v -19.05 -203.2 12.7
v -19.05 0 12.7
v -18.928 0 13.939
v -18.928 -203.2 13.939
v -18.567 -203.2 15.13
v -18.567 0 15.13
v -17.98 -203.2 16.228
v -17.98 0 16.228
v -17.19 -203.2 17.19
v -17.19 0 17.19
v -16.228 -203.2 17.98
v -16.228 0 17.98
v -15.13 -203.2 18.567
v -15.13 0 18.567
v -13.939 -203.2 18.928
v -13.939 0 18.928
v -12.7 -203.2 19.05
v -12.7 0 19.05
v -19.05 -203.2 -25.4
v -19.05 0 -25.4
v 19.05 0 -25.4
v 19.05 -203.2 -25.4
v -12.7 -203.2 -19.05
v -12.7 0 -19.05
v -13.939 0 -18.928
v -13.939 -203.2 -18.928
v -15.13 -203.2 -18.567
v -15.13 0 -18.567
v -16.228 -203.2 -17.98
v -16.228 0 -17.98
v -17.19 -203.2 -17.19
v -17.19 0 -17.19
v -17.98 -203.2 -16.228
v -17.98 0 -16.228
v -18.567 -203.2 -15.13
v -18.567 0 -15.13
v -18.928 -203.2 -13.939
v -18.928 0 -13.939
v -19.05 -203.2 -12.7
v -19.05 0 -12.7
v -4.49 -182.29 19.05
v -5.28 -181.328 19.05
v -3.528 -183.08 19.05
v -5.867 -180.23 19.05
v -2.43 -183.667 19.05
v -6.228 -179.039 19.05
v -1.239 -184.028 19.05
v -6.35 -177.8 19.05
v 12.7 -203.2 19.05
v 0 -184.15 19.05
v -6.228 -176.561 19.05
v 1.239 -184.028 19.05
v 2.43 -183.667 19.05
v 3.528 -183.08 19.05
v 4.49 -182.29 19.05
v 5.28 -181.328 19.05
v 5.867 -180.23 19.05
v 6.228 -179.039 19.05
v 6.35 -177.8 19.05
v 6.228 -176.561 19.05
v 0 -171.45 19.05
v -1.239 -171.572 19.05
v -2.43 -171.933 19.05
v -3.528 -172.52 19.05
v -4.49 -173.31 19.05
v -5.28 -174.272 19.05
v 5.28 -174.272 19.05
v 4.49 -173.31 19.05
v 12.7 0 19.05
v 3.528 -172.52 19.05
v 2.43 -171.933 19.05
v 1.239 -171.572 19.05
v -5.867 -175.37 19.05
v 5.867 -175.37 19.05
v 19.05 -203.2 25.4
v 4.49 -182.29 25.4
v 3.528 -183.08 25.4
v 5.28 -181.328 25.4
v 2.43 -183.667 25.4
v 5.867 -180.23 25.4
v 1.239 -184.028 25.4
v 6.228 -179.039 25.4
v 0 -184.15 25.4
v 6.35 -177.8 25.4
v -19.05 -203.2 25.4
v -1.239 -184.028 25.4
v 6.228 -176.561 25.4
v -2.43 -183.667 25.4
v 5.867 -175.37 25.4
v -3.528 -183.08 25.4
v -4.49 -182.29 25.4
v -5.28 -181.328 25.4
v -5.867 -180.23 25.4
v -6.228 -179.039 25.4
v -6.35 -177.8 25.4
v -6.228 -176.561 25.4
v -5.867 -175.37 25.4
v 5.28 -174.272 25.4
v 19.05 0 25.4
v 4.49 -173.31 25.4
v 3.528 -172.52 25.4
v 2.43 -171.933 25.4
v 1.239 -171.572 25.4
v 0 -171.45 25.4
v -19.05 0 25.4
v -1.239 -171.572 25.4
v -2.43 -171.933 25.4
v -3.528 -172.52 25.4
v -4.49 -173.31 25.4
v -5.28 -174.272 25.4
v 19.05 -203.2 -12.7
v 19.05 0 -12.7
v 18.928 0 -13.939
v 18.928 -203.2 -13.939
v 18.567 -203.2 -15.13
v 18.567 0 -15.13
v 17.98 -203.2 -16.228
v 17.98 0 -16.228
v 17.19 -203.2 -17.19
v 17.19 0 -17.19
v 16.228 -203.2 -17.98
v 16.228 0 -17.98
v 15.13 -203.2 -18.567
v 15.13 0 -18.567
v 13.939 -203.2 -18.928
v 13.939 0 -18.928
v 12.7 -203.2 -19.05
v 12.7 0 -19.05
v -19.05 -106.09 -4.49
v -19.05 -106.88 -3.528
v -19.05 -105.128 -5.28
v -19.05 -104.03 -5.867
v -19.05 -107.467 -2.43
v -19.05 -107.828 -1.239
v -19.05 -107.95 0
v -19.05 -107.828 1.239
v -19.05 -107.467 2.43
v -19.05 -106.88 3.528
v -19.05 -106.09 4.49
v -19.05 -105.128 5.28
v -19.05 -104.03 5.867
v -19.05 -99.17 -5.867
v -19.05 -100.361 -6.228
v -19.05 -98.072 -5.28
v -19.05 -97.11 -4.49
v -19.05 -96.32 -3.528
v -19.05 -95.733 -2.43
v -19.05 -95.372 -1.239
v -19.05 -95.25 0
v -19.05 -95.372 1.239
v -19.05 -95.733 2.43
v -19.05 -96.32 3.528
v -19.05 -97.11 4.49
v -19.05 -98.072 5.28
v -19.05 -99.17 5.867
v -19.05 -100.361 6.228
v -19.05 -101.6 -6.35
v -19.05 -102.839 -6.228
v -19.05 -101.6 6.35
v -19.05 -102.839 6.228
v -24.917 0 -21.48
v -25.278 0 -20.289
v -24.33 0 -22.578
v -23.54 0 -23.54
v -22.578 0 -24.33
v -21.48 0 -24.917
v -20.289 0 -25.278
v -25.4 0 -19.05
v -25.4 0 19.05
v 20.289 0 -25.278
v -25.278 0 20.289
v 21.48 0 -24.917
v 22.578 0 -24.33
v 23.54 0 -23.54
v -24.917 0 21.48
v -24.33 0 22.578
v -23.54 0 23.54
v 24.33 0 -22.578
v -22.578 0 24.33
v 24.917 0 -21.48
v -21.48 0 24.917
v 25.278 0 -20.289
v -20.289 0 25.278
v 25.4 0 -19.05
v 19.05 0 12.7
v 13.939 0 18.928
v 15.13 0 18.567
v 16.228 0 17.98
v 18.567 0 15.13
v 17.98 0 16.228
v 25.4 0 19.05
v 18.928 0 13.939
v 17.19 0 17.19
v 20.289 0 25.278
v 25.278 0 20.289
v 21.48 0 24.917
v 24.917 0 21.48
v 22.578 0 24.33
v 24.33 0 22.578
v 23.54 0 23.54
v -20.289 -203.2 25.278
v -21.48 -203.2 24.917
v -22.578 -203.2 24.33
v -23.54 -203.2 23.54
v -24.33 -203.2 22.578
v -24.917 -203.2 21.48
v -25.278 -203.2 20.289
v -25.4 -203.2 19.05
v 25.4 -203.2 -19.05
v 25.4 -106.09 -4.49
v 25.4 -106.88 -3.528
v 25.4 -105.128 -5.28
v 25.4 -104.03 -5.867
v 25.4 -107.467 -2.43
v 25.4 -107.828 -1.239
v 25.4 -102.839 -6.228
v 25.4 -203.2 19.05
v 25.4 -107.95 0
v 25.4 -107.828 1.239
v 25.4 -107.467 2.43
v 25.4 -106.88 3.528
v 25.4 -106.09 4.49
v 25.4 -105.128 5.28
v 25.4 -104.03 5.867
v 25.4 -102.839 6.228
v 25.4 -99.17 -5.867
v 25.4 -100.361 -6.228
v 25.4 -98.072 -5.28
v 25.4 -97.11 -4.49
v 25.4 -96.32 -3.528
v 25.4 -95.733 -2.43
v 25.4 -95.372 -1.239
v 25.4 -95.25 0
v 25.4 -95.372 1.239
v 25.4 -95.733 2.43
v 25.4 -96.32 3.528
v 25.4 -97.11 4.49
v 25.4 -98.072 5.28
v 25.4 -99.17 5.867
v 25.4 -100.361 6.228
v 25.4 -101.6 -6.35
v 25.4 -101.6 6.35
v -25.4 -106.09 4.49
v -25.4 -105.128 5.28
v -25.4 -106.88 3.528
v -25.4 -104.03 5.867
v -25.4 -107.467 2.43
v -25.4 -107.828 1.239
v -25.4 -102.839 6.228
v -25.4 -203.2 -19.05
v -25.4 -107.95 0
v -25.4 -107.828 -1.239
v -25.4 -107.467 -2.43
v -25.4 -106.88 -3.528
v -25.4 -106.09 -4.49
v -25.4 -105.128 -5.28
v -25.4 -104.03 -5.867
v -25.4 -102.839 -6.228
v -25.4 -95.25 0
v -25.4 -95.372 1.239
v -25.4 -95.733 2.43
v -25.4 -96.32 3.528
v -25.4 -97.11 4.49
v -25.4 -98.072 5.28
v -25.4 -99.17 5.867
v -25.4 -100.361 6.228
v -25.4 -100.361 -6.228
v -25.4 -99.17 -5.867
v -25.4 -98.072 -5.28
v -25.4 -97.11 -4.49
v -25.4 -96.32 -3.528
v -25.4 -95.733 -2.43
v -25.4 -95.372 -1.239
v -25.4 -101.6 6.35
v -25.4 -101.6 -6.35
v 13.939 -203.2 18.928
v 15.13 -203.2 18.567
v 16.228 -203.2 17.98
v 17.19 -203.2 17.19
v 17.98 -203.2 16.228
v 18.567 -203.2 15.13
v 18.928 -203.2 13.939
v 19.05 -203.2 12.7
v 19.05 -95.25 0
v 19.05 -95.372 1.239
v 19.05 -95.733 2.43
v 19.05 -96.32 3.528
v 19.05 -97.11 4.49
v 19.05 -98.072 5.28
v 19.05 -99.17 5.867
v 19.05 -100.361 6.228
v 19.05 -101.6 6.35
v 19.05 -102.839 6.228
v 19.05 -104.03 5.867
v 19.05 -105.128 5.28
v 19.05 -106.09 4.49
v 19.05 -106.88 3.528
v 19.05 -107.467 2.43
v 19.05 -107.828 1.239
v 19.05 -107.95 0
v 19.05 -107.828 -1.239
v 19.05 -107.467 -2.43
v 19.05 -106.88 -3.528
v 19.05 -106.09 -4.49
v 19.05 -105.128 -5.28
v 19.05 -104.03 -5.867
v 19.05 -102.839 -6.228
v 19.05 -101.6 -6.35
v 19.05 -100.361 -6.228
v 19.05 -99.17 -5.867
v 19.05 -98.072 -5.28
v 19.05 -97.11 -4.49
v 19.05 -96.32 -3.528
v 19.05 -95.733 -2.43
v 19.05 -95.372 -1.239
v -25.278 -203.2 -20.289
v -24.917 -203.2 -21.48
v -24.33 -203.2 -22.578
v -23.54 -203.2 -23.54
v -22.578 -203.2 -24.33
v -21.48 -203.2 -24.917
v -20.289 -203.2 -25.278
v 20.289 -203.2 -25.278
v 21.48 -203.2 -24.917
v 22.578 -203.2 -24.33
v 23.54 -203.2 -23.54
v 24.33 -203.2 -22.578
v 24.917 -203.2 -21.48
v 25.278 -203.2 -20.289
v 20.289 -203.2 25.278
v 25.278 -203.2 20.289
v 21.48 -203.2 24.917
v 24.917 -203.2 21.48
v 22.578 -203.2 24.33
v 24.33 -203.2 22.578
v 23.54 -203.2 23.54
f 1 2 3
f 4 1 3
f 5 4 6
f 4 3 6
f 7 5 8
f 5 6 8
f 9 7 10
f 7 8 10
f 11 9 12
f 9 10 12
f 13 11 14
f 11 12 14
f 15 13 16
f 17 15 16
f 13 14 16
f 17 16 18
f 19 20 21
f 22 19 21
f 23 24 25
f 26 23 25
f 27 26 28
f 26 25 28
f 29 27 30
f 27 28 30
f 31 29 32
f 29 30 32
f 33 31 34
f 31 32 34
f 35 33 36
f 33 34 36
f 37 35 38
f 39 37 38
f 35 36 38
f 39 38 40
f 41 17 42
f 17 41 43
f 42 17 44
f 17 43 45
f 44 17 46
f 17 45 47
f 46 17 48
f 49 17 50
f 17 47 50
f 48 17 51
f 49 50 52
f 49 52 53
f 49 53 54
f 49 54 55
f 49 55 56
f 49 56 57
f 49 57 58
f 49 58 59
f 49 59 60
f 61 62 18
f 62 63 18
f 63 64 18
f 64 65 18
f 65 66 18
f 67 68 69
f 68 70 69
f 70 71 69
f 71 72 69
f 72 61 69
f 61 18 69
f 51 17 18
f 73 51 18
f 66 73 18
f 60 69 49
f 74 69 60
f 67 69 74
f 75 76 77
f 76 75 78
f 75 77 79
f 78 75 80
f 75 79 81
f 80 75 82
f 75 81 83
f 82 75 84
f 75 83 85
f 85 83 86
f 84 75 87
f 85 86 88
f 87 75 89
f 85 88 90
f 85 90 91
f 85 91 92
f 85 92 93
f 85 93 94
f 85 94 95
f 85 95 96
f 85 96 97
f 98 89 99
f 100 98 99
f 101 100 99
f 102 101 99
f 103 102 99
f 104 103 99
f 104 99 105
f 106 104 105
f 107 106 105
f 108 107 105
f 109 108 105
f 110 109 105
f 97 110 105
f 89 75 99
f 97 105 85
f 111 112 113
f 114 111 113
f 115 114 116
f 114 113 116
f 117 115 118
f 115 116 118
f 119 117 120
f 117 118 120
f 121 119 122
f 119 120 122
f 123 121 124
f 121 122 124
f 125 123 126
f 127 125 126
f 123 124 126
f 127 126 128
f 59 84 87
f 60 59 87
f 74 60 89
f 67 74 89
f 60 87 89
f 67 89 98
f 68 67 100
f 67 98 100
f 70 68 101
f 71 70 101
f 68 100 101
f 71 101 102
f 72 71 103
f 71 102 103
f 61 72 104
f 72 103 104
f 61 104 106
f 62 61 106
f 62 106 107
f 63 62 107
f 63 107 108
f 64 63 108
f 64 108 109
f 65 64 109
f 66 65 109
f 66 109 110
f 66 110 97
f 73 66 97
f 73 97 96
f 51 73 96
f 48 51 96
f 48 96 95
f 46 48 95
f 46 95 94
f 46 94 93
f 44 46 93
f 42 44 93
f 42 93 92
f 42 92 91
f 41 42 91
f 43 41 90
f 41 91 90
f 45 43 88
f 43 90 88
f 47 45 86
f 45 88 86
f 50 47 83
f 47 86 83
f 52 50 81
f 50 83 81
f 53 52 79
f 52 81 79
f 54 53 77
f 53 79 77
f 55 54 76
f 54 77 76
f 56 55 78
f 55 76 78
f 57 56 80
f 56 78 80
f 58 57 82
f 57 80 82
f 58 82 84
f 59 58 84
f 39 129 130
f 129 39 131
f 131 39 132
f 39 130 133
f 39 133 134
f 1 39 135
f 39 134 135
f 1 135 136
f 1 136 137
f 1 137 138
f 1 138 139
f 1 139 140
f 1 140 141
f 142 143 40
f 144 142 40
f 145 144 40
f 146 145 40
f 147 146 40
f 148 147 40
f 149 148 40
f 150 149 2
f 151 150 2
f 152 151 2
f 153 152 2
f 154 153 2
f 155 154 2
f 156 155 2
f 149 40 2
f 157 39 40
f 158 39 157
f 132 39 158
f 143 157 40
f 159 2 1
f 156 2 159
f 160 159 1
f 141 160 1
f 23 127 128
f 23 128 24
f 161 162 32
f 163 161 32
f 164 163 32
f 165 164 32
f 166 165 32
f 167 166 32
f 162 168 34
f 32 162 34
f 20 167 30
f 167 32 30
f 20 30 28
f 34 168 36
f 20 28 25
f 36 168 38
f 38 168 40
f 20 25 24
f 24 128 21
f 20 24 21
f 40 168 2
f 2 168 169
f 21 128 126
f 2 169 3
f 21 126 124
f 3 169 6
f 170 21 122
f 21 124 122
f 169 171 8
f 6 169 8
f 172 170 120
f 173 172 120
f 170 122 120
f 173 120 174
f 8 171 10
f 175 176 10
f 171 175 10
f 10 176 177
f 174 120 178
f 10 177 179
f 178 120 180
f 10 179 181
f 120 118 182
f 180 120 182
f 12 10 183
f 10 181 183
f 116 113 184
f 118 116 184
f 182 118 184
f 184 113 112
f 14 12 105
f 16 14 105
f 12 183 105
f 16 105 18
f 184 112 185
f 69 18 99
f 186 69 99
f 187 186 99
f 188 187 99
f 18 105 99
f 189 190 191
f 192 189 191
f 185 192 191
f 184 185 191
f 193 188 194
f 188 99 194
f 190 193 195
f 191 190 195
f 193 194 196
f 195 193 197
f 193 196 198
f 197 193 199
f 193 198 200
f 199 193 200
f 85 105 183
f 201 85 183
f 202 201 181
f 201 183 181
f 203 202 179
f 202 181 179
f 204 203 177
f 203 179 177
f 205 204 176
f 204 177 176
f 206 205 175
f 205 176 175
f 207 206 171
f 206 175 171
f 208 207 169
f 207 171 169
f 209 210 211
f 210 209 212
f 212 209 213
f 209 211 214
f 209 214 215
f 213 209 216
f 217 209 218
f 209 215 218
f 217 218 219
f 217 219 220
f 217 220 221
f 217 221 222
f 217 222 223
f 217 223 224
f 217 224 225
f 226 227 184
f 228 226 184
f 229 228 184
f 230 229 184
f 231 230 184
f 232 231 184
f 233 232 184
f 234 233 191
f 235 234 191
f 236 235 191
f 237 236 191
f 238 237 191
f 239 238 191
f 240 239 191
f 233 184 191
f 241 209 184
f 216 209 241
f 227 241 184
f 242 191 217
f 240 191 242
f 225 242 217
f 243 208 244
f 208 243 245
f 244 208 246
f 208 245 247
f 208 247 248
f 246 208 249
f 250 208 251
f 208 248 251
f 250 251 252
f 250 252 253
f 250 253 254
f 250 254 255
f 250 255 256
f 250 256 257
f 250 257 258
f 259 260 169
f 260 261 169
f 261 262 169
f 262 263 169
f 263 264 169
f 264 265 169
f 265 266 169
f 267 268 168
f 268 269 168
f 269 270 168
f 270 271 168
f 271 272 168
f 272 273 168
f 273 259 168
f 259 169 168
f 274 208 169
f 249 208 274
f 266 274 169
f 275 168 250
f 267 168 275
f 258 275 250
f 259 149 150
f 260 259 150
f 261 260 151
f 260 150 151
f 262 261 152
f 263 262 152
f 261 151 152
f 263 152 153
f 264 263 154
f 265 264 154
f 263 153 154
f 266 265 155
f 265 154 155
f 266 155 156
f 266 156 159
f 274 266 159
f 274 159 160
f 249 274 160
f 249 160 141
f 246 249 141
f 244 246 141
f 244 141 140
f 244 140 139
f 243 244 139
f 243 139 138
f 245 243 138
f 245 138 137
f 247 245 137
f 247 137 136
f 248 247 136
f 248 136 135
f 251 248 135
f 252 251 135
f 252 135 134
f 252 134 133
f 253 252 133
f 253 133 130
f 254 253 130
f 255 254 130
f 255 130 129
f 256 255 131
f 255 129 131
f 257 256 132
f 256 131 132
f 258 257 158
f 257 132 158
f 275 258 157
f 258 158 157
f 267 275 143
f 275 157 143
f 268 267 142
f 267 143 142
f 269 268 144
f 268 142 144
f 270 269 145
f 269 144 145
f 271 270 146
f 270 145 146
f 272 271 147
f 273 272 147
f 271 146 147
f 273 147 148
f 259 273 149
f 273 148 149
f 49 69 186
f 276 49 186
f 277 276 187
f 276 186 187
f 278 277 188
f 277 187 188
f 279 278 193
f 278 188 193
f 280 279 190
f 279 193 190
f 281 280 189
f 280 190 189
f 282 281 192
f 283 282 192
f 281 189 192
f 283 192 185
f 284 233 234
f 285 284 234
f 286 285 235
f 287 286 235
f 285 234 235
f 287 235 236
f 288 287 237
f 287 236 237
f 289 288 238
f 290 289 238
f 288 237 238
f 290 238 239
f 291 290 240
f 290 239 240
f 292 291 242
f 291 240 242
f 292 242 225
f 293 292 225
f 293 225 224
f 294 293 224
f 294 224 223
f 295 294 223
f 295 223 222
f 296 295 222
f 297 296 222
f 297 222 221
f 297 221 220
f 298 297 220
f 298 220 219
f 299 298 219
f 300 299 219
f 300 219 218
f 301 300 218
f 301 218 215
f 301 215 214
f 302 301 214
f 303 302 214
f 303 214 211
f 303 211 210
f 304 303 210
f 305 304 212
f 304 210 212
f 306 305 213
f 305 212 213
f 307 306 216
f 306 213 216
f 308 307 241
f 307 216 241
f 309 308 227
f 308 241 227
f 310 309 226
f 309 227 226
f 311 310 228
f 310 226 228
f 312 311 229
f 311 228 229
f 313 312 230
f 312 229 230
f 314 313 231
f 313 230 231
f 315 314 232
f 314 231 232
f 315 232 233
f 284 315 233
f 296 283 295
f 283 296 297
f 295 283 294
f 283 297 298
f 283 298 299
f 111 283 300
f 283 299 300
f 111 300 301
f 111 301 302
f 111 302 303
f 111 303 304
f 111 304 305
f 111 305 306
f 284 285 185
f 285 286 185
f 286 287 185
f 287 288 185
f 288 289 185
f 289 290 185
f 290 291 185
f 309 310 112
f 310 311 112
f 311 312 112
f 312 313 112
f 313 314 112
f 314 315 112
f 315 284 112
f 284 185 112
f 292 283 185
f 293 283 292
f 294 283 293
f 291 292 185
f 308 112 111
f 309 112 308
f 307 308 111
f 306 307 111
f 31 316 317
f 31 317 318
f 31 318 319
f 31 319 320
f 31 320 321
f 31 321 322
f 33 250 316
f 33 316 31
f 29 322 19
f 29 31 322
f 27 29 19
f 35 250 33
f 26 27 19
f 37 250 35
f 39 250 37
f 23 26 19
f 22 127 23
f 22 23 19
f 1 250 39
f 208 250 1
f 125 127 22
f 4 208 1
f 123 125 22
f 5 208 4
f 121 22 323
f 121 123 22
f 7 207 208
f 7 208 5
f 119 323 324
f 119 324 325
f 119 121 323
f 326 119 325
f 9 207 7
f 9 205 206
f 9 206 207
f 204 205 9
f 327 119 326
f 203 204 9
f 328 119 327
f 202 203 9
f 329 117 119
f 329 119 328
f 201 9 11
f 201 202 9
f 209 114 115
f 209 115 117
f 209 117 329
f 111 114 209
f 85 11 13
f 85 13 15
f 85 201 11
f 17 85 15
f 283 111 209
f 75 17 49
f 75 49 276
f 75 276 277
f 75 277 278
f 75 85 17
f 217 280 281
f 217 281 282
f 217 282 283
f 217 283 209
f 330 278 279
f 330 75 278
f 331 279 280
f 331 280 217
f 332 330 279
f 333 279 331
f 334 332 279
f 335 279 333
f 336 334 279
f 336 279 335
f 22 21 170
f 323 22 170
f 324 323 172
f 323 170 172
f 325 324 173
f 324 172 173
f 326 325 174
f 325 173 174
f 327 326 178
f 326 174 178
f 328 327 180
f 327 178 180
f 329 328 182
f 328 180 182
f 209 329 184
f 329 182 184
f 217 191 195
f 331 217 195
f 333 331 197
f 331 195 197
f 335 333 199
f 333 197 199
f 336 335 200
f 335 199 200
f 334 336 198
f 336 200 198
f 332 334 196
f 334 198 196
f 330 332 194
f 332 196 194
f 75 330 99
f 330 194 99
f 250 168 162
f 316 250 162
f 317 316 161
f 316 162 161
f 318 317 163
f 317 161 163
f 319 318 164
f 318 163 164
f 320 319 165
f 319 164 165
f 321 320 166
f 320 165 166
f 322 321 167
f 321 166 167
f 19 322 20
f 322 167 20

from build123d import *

# Parameters (mm, degrees)
F1_DEPTH = 203.2
F2_R     = 6.35
F3_DEPTH = 50.8
F4_R     = 6.35
F5_DEPTH = 25.4


with BuildPart() as f1:
    # F0 (on Front) → F1 (new body)
    with BuildSketch(Plane.XZ):
        with BuildLine():
            Line((-19.05, -25.4), (19.05, -25.4))
            ThreePointArc((19.05, -25.4), (23.540128, -23.540128), (25.4, -19.05))
            Line((25.4, -19.05), (25.4, 19.05))
            ThreePointArc((25.4, 19.05), (23.540128, 23.540128), (19.05, 25.4))
            Line((19.05, 25.4), (-19.05, 25.4))
            ThreePointArc((-19.05, 25.4), (-23.540128, 23.540128), (-25.4, 19.05))
            Line((-25.4, 19.05), (-25.4, -19.05))
            ThreePointArc((-25.4, -19.05), (-23.540128, -23.540128), (-19.05, -25.4))
        make_face()
        with BuildLine():
            ThreePointArc((19.05, -12.7), (17.190128, -17.190128), (12.7, -19.05))
            Line((12.7, -19.05), (-12.7, -19.05))
            ThreePointArc((-12.7, -19.05), (-17.190128, -17.190128), (-19.05, -12.7))
            Line((-19.05, -12.7), (-19.05, 12.7))
            ThreePointArc((-19.05, 12.7), (-17.190128, 17.190128), (-12.7, 19.05))
            Line((-12.7, 19.05), (12.7, 19.05))
            ThreePointArc((12.7, 19.05), (17.190128, 17.190128), (19.05, 12.7))
            Line((19.05, 12.7), (19.05, -12.7))
        make_face(mode=Mode.SUBTRACT)
    extrude(amount=F1_DEPTH)

    # F2 (on face) → F3 (cut)
    with BuildSketch(Plane.YZ.offset(25.4)):
        with Locations((-101.6, 0)):
            Circle(F2_R)
    extrude(amount=-F3_DEPTH, mode=Mode.SUBTRACT)

    # F4 (on face) → F5 (cut)
    with BuildSketch(Plane.XY.offset(25.4)):
        with Locations((0, -177.8)):
            Circle(F4_R)
    extrude(amount=-F5_DEPTH, mode=Mode.SUBTRACT)


solid = f1.part
